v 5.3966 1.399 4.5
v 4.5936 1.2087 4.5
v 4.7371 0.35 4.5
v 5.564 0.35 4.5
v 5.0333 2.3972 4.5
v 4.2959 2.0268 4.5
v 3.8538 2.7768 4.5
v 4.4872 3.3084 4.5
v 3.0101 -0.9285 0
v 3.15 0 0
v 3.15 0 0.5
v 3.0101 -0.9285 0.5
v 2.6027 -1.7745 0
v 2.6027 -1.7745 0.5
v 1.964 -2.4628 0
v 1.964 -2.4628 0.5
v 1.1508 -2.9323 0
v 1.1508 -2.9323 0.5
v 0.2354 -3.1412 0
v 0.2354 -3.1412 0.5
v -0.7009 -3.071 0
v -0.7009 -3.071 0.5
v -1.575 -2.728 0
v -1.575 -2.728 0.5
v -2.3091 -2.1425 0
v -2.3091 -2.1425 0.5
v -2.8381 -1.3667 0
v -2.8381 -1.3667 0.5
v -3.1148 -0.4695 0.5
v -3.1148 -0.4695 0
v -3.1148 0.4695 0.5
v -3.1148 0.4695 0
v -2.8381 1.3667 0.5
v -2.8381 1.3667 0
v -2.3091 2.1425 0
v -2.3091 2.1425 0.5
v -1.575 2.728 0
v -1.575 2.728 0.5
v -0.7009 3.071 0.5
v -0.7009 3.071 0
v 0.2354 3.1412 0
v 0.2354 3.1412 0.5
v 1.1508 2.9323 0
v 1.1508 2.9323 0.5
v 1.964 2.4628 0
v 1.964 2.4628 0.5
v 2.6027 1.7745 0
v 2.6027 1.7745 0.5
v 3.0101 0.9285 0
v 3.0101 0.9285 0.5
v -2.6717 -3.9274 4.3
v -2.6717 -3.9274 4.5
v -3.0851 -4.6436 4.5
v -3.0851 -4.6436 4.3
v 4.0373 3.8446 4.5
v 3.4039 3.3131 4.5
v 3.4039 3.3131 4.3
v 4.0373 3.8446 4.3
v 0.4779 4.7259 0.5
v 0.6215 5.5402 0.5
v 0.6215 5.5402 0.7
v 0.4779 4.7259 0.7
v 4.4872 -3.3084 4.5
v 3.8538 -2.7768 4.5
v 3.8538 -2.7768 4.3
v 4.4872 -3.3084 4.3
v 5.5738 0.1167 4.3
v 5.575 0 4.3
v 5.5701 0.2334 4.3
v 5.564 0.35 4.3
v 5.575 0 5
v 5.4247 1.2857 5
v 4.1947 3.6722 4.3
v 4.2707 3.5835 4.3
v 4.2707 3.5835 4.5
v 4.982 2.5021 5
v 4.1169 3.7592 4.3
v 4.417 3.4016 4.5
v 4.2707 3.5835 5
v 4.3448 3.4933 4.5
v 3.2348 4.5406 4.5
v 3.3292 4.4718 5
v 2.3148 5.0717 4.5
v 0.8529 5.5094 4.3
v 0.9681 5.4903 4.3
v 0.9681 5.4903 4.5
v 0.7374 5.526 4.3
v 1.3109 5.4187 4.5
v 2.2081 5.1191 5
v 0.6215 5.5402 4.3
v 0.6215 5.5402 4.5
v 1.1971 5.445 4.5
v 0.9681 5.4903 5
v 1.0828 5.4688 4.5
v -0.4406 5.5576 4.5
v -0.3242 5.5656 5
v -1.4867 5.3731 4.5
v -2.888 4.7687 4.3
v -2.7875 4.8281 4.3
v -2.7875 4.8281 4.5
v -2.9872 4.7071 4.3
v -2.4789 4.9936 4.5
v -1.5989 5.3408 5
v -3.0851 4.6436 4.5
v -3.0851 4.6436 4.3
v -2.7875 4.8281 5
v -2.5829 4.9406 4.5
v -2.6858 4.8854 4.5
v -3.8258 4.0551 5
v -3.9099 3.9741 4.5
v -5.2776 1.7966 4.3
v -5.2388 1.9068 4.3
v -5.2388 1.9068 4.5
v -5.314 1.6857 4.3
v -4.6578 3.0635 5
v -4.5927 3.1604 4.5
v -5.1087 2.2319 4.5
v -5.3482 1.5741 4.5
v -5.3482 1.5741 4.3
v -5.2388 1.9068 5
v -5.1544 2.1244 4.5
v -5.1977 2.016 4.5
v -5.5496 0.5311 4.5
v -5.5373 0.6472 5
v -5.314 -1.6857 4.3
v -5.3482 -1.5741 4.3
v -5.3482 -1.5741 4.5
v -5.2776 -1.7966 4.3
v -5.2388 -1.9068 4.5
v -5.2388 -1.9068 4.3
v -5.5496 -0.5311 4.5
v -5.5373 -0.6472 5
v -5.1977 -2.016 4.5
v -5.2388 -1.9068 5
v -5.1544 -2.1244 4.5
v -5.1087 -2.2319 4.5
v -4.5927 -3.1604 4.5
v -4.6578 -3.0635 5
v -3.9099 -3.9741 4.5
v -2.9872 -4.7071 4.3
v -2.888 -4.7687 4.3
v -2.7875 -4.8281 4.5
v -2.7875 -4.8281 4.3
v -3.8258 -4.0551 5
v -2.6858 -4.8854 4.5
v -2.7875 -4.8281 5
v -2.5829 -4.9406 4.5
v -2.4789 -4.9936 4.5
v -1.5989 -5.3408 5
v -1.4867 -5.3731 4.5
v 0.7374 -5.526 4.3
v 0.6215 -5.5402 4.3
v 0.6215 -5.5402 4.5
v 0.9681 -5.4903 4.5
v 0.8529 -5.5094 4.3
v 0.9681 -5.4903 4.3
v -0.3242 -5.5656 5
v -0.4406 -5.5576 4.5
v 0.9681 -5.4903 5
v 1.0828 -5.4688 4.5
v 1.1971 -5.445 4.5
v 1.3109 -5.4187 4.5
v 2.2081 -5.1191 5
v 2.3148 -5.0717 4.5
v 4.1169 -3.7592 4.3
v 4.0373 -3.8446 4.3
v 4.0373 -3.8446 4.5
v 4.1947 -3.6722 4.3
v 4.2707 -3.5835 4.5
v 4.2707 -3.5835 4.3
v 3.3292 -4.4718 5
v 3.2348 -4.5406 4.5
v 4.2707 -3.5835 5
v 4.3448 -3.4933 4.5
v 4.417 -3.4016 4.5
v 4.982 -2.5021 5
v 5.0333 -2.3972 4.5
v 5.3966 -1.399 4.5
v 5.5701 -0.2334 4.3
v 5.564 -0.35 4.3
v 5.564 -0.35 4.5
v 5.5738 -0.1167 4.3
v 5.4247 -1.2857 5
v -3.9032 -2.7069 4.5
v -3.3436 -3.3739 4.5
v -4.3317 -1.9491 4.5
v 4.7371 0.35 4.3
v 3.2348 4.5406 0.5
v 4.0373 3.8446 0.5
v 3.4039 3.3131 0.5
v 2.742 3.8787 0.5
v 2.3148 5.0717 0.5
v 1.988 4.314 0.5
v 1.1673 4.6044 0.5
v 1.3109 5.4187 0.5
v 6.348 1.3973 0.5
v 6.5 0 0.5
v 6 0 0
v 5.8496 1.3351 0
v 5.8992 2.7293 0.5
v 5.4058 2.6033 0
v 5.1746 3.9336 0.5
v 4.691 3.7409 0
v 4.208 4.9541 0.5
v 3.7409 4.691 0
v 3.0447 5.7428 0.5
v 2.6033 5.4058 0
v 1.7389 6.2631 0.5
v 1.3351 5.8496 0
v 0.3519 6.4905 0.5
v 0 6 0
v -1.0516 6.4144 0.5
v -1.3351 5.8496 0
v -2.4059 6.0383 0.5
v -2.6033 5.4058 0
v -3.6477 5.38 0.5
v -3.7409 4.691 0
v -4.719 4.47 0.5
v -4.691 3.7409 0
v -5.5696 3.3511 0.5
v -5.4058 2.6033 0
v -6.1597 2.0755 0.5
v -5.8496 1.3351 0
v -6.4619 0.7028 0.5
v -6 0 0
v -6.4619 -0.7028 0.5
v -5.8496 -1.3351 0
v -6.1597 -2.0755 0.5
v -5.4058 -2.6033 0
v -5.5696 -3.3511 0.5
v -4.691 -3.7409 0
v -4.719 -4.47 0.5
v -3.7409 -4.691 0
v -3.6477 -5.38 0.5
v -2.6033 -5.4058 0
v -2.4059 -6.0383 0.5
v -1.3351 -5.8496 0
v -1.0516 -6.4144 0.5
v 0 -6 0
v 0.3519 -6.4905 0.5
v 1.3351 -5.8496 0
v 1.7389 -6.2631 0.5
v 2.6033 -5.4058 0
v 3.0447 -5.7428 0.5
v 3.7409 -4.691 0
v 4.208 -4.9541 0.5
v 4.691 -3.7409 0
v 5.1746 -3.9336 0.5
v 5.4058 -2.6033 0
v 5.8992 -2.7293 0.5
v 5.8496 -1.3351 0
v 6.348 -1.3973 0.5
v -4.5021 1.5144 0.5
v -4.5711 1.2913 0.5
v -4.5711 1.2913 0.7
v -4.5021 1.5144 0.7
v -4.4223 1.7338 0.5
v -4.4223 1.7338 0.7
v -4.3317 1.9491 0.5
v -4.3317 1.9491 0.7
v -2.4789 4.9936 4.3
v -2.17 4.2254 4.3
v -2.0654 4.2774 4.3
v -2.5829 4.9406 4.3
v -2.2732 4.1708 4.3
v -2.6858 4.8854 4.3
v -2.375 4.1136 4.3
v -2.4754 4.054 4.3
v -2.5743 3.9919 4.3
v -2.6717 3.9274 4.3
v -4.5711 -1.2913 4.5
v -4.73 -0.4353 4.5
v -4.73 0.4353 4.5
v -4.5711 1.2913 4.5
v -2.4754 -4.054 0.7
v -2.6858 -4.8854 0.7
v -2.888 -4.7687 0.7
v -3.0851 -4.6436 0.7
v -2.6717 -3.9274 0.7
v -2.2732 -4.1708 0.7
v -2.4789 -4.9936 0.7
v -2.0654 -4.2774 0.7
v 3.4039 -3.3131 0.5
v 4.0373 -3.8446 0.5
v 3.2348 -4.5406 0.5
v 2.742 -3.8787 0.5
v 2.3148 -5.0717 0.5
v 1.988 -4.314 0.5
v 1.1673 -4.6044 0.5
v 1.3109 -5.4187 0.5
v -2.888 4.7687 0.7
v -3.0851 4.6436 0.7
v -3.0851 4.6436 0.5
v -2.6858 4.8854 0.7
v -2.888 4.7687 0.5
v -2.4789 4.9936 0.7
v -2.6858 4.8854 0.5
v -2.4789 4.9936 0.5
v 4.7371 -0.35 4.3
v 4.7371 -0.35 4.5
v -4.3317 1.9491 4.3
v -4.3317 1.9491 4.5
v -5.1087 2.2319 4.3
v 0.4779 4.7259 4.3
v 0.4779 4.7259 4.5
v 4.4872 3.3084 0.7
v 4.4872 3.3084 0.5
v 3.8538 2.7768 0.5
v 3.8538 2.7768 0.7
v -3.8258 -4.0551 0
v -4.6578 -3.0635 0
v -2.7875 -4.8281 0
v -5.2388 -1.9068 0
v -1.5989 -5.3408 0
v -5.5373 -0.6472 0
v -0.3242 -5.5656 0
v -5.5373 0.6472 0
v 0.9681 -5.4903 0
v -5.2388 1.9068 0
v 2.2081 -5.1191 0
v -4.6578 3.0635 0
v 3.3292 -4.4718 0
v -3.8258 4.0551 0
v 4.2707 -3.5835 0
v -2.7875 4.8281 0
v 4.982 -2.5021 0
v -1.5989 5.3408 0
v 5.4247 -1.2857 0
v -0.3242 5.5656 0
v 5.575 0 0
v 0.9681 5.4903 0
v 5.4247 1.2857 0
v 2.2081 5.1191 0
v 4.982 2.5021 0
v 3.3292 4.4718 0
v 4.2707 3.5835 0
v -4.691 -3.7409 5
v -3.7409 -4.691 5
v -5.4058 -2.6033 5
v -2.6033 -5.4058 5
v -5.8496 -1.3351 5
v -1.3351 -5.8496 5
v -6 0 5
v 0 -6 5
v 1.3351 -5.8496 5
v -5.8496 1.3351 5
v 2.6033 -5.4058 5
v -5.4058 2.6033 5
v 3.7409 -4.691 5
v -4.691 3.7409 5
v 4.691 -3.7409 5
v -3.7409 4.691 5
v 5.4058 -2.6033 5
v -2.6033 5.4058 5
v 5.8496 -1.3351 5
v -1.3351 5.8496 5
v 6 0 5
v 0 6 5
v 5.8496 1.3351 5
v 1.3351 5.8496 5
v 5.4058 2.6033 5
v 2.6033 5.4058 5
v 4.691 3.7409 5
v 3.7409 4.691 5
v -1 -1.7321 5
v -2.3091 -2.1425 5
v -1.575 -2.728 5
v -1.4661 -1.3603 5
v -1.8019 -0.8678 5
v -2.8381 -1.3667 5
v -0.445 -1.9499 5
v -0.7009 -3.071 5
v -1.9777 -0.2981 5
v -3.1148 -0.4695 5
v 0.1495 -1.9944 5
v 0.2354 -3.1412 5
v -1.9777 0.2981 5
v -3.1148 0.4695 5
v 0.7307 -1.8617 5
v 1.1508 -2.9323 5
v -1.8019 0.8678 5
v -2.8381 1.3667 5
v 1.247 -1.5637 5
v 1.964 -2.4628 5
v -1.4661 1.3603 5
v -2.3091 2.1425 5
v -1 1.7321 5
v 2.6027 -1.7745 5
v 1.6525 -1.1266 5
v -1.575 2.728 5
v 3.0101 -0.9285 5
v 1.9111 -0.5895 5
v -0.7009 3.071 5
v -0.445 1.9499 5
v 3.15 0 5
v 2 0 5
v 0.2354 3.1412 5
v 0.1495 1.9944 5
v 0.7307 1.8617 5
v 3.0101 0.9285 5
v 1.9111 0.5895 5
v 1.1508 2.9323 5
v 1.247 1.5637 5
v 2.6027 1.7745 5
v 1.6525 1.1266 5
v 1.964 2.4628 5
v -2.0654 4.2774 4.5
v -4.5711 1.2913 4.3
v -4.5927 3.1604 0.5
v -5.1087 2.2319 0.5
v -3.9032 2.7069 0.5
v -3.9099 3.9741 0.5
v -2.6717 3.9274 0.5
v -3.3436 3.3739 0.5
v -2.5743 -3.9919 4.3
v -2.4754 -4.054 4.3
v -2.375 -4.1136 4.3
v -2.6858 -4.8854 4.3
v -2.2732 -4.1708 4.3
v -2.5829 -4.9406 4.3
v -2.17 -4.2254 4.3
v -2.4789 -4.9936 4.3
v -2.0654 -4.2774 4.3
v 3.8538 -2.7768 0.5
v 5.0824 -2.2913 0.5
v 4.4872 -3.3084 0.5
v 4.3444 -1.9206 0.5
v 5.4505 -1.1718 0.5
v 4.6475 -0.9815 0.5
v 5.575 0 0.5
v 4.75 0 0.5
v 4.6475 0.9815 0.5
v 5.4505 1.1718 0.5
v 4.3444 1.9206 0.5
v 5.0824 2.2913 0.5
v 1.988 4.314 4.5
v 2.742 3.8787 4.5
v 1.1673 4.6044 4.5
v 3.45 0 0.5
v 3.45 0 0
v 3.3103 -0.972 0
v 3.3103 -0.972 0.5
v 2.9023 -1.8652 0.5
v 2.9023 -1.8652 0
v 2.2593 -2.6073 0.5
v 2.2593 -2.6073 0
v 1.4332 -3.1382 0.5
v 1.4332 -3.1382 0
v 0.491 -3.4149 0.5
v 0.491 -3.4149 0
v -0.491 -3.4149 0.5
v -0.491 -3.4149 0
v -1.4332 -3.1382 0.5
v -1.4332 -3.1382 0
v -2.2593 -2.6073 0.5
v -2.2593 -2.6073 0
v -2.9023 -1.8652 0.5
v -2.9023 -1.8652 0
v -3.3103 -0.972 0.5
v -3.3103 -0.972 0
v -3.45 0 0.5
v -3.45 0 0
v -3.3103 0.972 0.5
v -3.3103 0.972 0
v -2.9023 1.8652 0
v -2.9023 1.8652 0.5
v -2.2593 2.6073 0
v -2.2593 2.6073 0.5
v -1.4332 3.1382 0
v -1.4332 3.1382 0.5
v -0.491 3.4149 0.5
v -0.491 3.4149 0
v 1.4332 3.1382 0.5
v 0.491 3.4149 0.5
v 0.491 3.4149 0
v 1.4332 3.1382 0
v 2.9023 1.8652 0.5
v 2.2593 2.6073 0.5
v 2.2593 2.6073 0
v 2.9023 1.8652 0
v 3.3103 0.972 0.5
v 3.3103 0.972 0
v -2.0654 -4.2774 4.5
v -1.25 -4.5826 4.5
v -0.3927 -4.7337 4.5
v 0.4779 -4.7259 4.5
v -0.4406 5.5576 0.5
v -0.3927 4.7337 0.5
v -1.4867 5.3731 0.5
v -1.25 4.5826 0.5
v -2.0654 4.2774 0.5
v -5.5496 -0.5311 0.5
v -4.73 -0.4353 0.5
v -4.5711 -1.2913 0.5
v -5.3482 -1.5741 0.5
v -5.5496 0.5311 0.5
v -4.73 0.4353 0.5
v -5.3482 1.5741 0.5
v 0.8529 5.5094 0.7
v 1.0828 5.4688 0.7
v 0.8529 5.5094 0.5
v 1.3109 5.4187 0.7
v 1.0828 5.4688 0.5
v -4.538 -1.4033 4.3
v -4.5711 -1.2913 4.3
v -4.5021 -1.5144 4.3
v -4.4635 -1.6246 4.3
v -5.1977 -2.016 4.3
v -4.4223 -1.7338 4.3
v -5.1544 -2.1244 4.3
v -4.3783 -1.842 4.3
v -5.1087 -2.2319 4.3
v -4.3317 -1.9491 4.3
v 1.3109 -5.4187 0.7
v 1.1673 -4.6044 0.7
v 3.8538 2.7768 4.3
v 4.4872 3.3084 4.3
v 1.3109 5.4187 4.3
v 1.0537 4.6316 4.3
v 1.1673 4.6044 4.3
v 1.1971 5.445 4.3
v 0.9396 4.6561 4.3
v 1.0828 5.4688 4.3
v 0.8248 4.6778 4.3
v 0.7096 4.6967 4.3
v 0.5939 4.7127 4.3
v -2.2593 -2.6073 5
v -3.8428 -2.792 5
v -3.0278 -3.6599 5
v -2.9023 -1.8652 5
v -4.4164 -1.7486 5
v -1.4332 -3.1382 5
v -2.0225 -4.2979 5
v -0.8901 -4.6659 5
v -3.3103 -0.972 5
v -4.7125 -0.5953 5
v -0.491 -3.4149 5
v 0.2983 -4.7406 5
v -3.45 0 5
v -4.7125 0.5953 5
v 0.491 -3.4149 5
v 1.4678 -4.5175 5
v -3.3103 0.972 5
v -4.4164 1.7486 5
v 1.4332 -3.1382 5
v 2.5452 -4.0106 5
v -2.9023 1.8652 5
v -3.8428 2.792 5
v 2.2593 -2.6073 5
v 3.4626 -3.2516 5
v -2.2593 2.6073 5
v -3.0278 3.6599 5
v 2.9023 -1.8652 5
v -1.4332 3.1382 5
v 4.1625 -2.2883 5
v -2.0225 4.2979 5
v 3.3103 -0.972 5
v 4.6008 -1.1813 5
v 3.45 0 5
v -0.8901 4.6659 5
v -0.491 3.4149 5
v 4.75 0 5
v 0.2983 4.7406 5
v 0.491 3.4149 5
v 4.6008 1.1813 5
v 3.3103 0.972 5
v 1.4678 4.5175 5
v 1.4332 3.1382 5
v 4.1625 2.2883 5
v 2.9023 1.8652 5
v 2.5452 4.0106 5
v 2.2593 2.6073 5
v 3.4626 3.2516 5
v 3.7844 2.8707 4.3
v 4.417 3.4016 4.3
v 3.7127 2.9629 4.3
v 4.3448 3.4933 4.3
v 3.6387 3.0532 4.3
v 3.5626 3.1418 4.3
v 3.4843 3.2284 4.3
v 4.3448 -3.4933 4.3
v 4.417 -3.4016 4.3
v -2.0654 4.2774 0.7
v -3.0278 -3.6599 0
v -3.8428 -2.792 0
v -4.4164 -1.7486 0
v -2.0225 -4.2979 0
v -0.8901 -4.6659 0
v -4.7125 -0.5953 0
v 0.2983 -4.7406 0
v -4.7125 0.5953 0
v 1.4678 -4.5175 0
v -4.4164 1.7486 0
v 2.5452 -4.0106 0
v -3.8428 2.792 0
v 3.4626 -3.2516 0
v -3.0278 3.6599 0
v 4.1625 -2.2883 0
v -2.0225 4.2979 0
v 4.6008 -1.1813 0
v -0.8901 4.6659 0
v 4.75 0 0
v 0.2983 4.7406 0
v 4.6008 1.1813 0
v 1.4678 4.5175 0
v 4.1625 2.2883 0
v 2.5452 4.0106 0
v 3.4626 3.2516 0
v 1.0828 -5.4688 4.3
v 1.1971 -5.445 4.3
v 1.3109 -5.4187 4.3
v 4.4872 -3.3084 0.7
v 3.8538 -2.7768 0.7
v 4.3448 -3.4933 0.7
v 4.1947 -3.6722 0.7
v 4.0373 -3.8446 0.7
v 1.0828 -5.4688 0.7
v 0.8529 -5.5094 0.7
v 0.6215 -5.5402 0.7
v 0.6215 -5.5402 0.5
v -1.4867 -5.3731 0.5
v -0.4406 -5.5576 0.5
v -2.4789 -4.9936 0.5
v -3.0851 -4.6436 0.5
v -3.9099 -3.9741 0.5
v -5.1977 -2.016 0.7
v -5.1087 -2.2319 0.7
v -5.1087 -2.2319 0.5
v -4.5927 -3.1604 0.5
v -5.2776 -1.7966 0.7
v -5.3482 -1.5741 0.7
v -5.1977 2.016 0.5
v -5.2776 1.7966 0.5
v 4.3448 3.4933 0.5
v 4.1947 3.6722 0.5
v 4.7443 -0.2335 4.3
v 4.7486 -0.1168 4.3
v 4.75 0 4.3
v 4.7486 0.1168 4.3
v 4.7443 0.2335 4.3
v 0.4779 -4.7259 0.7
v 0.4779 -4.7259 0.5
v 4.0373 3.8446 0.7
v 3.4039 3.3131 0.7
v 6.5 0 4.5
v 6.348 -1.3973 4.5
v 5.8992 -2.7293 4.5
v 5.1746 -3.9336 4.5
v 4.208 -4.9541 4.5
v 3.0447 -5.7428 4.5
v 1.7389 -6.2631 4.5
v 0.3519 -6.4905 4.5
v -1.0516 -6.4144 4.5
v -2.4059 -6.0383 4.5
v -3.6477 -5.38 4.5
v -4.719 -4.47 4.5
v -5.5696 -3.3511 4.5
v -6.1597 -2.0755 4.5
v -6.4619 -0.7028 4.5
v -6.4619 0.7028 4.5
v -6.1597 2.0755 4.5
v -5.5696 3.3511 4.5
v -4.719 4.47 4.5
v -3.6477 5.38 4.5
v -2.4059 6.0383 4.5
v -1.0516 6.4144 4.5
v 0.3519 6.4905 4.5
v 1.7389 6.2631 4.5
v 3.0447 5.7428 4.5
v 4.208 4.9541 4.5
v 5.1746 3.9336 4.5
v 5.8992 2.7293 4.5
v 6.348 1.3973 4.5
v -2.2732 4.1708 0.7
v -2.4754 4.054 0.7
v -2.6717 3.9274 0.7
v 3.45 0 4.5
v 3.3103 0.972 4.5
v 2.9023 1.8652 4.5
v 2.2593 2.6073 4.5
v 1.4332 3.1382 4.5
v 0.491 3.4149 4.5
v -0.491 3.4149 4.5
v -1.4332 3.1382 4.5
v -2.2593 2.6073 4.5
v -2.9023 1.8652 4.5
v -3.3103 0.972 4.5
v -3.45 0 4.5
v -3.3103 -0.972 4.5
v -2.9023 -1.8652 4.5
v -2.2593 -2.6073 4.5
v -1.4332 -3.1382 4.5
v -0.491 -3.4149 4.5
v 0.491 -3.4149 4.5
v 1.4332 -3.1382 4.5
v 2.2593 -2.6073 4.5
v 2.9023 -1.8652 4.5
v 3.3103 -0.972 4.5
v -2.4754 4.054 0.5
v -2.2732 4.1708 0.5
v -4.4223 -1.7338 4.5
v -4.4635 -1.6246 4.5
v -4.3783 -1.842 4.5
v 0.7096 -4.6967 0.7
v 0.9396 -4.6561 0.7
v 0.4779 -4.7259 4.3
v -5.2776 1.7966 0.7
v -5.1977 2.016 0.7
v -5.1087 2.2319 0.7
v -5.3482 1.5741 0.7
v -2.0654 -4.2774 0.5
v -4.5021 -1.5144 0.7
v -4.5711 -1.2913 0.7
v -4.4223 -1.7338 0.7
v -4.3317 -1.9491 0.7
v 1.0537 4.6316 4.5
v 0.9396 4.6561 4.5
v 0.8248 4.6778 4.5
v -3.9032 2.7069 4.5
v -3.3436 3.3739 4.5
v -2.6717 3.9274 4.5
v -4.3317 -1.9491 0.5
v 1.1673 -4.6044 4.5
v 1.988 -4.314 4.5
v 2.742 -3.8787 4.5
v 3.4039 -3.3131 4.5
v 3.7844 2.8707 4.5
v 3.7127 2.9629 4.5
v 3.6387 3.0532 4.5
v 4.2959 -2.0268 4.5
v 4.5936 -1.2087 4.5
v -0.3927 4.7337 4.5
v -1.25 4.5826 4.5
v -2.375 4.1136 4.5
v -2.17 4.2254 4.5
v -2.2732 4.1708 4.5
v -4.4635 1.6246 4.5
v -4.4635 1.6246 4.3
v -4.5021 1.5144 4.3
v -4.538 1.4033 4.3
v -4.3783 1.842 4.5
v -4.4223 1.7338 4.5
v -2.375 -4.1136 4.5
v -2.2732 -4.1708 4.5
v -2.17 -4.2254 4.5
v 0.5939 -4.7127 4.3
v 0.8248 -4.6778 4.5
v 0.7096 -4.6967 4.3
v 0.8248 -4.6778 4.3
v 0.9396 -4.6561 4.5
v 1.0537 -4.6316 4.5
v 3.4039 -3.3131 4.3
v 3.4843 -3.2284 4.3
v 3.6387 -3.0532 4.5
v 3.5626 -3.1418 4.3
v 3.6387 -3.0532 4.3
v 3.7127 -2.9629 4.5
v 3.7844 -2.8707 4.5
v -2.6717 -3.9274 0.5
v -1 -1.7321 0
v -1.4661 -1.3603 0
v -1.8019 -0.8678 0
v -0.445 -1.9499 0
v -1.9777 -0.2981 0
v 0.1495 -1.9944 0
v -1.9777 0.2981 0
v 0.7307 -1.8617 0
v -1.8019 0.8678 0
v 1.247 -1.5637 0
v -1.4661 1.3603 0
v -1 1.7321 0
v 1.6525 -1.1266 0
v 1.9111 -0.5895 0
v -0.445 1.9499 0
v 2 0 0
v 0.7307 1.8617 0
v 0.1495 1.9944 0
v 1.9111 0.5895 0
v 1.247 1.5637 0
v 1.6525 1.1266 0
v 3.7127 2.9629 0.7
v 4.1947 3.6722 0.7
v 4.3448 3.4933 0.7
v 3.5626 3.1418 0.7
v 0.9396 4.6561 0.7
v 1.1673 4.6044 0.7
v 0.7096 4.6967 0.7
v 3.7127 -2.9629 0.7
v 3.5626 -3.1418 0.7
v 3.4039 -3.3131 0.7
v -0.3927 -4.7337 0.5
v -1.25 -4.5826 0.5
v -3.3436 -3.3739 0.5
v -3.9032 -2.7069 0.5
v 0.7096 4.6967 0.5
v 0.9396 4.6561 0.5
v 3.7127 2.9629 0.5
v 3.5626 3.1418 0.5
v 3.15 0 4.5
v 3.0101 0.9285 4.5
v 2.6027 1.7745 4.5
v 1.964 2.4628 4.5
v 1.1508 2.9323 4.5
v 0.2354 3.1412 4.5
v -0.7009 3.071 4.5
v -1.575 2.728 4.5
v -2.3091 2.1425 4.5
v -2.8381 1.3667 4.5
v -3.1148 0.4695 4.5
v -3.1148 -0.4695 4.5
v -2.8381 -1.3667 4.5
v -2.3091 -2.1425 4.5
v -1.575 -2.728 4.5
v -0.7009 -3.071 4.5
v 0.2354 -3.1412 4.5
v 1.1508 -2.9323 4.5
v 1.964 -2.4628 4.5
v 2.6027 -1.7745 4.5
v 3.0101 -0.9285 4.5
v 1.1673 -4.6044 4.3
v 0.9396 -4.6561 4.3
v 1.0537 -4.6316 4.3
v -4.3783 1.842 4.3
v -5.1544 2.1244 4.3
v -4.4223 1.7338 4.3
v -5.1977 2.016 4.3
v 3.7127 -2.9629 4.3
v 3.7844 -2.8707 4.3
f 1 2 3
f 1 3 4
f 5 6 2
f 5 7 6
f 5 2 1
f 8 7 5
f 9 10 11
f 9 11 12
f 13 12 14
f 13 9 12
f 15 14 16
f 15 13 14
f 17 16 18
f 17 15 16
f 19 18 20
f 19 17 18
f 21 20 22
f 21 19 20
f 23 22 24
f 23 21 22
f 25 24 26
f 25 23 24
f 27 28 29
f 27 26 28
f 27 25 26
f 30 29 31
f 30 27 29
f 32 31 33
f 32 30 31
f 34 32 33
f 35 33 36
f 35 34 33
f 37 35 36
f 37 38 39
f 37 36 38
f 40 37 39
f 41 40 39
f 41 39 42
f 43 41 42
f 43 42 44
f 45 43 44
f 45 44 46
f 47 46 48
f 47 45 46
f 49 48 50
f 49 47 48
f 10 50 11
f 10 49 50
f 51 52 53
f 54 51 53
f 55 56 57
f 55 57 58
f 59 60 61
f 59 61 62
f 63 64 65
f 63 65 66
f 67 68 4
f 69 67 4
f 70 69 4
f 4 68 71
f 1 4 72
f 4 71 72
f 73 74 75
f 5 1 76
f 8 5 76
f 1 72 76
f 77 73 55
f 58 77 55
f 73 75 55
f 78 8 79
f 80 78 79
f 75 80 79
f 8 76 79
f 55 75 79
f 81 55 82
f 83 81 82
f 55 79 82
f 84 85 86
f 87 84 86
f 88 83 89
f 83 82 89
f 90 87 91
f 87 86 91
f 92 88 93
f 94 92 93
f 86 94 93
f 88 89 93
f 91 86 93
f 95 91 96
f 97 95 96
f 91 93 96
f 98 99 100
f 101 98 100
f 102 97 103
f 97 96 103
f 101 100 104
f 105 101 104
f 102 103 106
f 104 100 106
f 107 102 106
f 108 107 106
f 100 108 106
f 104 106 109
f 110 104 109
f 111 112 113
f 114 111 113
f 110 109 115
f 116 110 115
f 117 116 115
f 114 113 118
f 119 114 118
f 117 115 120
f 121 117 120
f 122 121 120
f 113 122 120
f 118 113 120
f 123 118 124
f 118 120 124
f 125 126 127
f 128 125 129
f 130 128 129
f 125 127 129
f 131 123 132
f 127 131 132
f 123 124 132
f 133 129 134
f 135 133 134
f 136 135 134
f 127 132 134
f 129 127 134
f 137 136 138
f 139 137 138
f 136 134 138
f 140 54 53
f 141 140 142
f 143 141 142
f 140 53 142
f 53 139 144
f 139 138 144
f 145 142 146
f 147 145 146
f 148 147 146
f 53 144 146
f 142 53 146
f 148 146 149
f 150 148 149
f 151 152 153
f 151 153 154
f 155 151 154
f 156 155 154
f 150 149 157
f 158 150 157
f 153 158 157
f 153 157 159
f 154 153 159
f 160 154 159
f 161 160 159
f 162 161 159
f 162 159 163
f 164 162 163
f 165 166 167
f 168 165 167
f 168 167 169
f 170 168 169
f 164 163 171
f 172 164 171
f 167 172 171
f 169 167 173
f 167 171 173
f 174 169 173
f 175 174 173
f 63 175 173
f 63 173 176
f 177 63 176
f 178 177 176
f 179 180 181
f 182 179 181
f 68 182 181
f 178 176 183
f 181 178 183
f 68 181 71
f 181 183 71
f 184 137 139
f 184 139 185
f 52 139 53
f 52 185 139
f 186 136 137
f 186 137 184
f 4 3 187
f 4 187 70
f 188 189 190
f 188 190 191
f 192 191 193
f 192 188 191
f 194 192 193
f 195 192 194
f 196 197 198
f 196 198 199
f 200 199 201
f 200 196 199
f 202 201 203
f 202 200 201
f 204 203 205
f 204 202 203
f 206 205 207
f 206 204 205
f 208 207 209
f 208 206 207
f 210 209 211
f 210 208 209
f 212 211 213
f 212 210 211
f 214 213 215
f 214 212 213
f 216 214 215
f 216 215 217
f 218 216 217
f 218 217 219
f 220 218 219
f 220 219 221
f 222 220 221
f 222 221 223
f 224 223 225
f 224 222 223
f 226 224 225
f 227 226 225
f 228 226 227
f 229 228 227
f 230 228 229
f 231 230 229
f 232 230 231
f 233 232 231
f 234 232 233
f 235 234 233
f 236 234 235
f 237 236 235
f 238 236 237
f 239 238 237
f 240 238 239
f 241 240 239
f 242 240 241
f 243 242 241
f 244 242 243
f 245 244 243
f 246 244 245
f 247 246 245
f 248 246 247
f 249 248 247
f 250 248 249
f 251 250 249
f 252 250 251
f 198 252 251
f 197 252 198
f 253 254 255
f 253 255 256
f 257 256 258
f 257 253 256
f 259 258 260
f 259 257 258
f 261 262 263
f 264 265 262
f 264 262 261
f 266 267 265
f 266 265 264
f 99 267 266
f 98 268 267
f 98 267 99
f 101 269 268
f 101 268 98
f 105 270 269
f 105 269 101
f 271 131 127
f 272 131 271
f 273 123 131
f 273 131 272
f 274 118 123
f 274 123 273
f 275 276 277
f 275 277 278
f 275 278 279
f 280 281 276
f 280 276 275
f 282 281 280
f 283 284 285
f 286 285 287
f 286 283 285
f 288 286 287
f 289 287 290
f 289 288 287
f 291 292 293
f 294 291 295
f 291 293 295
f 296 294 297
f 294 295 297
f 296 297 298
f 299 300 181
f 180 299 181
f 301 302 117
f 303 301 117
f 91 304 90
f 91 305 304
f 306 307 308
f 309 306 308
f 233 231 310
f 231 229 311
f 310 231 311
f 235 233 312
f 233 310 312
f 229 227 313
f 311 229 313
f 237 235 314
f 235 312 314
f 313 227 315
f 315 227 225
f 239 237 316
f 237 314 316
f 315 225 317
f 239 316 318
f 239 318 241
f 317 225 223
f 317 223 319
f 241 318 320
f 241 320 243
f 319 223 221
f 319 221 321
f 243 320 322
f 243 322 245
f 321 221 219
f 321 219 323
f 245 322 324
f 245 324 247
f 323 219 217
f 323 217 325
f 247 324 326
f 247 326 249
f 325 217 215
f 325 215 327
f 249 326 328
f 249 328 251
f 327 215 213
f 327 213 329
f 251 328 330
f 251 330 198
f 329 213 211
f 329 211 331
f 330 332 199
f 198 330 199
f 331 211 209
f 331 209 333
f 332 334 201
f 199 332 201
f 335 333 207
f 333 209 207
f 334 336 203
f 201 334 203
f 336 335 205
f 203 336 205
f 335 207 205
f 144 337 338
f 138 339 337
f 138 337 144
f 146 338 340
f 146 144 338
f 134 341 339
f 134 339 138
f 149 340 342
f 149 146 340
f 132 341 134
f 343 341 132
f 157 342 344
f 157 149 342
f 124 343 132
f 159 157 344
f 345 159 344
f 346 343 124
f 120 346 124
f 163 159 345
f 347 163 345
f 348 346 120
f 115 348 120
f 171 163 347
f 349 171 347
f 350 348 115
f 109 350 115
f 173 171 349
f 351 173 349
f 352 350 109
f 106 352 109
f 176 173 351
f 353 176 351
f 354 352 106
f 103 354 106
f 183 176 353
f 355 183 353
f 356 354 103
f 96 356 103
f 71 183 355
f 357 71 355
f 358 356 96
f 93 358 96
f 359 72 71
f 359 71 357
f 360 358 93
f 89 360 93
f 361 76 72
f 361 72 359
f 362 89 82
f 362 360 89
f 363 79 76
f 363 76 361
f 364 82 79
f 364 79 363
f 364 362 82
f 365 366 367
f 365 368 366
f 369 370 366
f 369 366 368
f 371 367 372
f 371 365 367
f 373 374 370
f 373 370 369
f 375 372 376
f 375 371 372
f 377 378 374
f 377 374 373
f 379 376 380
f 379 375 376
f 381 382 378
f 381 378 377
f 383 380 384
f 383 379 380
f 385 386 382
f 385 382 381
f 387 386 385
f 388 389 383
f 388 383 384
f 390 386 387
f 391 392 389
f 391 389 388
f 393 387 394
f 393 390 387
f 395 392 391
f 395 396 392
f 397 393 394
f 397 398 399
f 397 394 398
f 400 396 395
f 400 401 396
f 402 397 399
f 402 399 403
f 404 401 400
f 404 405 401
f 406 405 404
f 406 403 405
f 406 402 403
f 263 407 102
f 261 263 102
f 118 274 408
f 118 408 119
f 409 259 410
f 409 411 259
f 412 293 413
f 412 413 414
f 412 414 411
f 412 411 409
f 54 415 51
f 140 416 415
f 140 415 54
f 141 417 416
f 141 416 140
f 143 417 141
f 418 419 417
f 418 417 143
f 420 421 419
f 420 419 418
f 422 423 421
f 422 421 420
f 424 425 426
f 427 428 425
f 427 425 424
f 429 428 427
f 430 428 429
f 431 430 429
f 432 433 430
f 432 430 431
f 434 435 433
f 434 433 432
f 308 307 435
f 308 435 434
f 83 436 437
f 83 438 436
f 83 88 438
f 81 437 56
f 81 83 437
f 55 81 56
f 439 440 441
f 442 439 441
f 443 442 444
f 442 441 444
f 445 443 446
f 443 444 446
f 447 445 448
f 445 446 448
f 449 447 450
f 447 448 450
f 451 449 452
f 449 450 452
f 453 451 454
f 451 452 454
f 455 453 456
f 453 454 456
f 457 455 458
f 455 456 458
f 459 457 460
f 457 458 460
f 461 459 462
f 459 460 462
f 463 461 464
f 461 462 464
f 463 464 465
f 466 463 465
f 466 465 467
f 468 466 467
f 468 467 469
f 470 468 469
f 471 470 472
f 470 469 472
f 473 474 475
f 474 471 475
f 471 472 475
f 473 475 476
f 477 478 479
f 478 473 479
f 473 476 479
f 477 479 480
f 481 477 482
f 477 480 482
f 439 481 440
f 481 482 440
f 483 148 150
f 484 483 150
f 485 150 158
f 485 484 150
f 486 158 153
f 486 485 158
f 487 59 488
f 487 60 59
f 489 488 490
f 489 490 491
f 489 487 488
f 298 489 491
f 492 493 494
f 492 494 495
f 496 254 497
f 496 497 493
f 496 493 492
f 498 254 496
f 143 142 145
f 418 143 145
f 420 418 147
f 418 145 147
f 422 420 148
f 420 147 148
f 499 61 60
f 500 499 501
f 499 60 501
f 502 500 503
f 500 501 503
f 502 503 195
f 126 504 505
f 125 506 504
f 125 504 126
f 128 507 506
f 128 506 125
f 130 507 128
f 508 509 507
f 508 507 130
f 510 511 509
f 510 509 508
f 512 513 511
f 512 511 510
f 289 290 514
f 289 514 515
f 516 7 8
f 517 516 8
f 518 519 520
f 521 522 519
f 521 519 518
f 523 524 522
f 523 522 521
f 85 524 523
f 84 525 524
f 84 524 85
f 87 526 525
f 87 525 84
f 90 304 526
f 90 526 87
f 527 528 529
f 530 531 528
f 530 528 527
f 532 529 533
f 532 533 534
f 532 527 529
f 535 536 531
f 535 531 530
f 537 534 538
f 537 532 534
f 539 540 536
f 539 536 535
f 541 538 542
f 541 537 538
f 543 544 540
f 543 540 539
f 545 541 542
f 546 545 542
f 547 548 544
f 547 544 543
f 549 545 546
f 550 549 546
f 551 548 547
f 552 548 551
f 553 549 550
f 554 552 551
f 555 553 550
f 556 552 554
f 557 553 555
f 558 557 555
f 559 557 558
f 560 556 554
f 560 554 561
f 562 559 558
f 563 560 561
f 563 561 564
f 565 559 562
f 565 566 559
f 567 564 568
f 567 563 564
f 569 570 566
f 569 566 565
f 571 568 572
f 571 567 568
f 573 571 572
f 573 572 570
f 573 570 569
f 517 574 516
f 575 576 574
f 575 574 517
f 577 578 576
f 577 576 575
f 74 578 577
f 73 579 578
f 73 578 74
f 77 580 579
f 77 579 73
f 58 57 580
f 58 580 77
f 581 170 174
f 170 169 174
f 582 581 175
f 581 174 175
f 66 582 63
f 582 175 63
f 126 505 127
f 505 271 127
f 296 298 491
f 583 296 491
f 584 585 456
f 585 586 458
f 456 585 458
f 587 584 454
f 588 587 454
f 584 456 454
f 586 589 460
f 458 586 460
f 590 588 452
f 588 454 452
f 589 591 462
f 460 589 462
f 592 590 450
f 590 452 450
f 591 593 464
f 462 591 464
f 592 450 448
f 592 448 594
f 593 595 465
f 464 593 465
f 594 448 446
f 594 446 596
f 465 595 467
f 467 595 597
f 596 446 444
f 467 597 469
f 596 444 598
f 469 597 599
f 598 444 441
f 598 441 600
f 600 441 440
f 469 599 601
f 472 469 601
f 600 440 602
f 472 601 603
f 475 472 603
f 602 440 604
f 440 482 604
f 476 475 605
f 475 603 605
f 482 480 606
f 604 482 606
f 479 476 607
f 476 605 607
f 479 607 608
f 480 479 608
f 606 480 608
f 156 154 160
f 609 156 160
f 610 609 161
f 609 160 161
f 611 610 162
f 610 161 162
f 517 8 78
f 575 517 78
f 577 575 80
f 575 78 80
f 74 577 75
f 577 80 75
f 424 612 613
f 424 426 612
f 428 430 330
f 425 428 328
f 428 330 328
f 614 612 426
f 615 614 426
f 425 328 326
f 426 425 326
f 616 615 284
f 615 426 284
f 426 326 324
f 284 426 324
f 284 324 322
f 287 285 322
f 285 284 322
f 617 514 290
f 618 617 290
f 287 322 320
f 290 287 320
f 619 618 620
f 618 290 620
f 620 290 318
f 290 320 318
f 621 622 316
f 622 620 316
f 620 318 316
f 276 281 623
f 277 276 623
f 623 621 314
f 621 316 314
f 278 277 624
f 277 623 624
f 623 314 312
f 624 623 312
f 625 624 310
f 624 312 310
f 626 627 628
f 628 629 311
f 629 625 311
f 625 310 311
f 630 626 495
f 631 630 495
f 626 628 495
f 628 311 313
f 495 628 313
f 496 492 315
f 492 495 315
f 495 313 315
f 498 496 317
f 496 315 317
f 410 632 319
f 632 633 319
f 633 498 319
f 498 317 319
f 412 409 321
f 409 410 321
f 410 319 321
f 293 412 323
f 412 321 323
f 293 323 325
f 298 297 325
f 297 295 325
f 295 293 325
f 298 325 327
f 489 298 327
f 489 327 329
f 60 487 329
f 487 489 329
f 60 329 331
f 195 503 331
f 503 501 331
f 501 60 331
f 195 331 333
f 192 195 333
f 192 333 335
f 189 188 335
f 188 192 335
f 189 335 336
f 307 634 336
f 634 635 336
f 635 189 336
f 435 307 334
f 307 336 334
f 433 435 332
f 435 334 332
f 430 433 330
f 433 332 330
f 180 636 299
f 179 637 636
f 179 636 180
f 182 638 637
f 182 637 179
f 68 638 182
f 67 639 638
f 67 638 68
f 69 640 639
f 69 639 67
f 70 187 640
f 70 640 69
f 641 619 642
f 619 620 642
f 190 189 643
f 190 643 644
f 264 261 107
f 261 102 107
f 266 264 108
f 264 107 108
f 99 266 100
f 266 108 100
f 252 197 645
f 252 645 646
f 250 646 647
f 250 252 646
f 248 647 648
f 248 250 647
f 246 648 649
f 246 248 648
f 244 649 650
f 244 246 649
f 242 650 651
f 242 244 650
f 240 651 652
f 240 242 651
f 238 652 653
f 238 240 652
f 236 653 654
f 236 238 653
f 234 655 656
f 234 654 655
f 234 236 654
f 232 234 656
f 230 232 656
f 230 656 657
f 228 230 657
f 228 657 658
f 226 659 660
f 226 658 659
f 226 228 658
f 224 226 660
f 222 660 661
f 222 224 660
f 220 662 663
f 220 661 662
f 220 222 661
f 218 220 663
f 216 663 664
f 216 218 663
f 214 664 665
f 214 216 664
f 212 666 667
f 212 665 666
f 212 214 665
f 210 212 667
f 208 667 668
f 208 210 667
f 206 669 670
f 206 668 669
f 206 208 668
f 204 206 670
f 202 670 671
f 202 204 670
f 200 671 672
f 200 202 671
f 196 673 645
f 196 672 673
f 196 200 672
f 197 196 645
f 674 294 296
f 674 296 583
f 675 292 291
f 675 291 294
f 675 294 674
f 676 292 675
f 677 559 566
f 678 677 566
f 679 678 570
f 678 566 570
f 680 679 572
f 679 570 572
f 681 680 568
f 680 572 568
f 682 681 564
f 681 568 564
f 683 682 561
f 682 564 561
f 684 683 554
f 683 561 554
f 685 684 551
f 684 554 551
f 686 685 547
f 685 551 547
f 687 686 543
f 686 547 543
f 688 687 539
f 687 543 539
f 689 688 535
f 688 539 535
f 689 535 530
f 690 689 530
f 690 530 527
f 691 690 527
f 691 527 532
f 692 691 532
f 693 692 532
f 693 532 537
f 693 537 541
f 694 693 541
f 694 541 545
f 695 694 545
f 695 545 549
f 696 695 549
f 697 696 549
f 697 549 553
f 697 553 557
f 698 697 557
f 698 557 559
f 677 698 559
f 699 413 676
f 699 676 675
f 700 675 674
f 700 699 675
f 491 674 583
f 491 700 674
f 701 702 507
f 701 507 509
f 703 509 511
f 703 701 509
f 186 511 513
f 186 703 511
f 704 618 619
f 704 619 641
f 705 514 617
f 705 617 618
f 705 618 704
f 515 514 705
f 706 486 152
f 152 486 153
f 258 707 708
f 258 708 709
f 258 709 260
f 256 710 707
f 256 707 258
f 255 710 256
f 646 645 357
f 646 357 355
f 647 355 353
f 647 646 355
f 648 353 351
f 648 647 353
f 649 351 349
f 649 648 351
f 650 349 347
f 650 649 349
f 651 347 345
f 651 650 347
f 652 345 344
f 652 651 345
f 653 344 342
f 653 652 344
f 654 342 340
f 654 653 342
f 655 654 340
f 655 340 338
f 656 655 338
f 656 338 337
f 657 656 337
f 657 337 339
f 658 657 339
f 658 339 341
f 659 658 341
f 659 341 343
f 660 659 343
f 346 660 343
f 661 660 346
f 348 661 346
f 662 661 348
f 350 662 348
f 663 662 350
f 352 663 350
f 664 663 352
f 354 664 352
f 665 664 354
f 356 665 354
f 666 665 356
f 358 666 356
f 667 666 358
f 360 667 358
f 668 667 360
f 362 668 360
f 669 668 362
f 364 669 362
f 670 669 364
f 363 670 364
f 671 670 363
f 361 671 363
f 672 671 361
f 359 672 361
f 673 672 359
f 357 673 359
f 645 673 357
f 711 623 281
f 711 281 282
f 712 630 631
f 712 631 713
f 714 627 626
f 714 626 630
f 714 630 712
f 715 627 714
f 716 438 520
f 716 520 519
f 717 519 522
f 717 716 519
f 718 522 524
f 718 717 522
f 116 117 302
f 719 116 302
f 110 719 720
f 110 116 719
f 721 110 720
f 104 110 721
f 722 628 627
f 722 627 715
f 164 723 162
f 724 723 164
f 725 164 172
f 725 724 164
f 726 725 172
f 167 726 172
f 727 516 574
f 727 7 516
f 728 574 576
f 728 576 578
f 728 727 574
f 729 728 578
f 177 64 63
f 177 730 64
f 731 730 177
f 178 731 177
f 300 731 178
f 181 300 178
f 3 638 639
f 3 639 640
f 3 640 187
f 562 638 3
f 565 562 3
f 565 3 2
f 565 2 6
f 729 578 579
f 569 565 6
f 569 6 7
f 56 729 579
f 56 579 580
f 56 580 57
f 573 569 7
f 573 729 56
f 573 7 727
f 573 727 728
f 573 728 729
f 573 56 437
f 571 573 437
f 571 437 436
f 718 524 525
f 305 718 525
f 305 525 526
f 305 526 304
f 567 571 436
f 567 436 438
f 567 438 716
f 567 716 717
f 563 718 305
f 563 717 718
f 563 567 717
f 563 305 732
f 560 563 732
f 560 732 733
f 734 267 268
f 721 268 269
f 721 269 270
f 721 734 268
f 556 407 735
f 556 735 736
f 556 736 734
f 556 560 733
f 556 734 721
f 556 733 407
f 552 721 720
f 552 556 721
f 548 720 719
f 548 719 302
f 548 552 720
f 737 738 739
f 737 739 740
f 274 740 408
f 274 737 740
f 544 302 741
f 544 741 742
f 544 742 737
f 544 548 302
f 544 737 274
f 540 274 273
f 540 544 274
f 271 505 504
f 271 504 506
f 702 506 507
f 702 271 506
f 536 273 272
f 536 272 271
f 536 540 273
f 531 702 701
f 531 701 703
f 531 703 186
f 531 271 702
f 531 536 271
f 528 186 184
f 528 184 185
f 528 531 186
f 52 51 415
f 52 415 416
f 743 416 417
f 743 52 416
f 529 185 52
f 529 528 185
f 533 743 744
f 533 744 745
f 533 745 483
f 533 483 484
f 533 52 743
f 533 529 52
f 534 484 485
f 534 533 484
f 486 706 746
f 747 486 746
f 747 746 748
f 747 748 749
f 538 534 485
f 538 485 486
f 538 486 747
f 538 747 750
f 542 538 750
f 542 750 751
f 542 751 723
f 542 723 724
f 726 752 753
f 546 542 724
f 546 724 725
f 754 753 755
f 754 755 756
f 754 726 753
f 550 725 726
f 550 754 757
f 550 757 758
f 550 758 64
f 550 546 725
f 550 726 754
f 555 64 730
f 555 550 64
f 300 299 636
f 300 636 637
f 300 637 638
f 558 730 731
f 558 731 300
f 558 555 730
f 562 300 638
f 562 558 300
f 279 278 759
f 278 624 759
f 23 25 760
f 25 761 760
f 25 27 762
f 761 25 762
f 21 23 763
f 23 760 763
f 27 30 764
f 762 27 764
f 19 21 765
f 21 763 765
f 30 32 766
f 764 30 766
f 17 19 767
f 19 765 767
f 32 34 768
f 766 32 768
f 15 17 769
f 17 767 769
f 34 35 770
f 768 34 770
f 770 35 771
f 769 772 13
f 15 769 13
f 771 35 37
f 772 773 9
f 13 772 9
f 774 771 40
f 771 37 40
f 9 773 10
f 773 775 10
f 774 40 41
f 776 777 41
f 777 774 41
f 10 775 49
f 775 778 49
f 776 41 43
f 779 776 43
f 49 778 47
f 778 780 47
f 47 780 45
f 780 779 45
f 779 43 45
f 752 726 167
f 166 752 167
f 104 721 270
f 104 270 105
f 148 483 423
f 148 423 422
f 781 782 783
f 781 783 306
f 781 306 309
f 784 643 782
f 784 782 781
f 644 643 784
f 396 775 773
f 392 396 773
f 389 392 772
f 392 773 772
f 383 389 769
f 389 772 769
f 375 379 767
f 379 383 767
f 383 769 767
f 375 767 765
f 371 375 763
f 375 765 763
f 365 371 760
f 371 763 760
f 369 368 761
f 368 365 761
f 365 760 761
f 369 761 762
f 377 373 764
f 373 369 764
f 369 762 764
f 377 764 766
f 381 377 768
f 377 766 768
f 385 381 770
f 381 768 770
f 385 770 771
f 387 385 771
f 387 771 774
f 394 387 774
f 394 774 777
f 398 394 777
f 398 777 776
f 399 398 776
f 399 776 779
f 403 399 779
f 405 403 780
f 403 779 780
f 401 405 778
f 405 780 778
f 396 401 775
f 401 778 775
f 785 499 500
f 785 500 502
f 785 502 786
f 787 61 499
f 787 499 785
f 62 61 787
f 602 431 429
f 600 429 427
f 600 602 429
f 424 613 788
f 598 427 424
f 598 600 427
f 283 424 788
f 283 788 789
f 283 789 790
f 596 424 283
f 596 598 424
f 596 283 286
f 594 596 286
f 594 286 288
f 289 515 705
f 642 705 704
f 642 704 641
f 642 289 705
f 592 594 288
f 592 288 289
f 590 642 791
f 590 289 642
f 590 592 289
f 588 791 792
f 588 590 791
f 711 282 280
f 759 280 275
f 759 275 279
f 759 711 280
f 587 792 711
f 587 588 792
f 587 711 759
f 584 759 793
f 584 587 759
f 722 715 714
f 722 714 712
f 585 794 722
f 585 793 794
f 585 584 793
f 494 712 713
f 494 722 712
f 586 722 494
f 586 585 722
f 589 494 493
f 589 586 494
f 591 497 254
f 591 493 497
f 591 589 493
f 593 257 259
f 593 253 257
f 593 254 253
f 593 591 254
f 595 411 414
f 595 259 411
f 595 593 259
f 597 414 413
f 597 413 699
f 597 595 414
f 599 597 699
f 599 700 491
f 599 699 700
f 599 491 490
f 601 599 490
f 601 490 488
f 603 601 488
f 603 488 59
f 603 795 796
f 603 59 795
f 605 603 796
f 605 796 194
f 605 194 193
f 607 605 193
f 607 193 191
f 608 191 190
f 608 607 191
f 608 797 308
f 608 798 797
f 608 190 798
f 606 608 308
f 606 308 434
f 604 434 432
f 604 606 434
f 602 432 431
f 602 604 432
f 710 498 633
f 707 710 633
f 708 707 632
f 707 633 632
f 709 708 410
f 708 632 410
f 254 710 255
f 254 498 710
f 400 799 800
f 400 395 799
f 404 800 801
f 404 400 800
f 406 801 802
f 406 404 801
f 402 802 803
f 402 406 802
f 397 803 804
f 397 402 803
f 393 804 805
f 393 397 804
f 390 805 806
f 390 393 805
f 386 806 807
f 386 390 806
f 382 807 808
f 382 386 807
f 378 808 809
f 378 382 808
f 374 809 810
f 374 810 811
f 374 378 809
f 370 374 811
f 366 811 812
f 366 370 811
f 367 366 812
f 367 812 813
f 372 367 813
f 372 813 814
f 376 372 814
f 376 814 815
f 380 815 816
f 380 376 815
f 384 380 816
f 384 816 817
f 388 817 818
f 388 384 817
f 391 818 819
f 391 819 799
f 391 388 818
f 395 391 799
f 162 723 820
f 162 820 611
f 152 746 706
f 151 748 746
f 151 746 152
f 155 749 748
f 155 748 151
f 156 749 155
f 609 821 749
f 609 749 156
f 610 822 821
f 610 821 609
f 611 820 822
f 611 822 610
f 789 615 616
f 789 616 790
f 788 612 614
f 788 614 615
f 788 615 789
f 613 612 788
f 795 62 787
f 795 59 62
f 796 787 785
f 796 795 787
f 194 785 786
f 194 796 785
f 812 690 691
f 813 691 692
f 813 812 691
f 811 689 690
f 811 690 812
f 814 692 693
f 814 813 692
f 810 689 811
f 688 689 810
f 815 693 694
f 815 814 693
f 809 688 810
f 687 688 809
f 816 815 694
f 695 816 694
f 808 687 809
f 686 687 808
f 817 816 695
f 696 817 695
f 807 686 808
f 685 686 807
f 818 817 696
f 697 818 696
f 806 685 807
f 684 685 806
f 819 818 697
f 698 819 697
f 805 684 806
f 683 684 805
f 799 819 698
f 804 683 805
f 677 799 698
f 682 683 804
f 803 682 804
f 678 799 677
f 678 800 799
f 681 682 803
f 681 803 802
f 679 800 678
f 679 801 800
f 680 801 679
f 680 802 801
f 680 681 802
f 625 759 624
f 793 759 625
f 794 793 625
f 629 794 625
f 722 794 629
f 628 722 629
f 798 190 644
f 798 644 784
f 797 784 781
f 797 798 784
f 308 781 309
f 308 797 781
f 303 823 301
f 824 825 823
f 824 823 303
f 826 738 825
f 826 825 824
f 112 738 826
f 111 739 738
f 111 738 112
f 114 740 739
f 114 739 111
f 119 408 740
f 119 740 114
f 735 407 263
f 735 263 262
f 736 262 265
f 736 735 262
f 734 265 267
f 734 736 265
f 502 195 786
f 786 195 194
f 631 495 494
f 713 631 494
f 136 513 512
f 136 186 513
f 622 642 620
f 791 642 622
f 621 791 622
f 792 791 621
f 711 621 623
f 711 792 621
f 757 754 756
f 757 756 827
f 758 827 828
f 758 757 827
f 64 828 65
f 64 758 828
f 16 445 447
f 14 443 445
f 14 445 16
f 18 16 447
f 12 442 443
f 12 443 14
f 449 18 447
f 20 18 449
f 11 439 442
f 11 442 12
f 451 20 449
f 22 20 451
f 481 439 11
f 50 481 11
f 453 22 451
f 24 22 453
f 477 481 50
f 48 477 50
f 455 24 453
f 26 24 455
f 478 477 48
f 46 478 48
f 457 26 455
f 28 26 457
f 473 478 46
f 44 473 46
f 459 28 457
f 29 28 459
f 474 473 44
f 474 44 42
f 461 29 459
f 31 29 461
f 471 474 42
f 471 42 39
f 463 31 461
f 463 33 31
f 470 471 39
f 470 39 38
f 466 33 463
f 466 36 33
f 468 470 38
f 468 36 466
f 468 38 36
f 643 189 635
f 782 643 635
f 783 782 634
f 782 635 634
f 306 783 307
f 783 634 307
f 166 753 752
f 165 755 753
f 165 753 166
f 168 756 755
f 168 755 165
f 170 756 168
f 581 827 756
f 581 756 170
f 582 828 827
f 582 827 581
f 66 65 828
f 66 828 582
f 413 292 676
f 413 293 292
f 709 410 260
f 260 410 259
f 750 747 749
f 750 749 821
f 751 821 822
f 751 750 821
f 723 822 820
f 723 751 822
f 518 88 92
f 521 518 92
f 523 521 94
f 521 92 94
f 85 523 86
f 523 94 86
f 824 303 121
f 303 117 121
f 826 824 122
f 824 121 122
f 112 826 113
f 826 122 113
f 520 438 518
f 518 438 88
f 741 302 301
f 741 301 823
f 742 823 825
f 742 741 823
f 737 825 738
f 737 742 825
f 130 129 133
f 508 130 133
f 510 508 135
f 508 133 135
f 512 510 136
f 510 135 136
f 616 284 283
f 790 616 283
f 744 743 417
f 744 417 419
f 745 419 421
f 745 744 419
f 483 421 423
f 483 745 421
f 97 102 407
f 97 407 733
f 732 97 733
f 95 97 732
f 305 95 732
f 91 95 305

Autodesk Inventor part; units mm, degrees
ref_plane "YZ Plane" through (0, 0, 0) normal (1, 0, 0) x (0, 1, 0)
ref_plane "XZ Plane" through (0, 0, 0) normal (0, 1, 0) x (-1, 0, 0)
sketch "Sketch1" plane through (0, 0, 0) normal (0, 0, 1) x (1, 0, 0)
  circle A0 centre (0, 0) radius 6.5
  circle A1 centre (0, 0) radius 2
  dimension "d0" = 13
  dimension "d1" = 4
extrude "Extrusion1" add sketch "Sketch1" along normal blind 5
chamfer "Chamfer1" distance 0.5 angle 45 2 edges at (-6.5, 0, 5) (-6.5, 0, 0)
sketch "Sketch2" plane through (0, 0, 5) normal (0, 0, 1) x (1, 0, 0)
  circle A0 centre (0, 0) radius 6 projected
  circle A1 centre (0, 0) radius 3.15
  circle A2 centre (0, 0) radius 3.45
  circle A3 centre (0, 0) radius 4.75
  circle A4 centre (0, 0) radius 5.575
  dimension "d7" = 6.3
  dimension "d8" = 6.9
  dimension "d9" = 9.5
  dimension "d10" = 11.15
extrude "Extrusion2" cut sketch "Sketch2" against normal blind 0.5 contours A2 | A4
ref_plane "Work Plane1" through (0, 0, 2.5) normal (0, 0, -1) x (-1, 0, 0)
sketch "Sketch3" plane through (0, 0, 4.5) normal (0, 0, 1) x (1, 0, 0)
  circle A0 centre (0, 0) radius 4.75 projected
  circle A1 centre (0, 0) radius 5.575 projected
  circle A2 centre (0, 0) radius 4.75 construction
  circle A3 centre (0, 0) radius 5.575 construction
  line L0 (-9.1, 0) -> (9.1, 0) construction
  line L1 (4.6568, 0.35) -> (5.7132, 0.35)
  line L2 (4.5944, -0.35) -> (5.8021, -0.35)
  line L3 (5.349, 0.35) -> (5.7285, 0.35)
  arc A4 (4.7371, -0.35) -> (4.7371, 0.35) centre (0, 0) ccw
  arc A5 (5.564, -0.35) -> (5.564, 0.35) centre (0, 0) ccw
  dimension "d14" = 0.35
  dimension "d15" = 0.35
extrude "Extrusion3" cut sketch "Sketch3" against normal blind 0.2 contours A0 L1 A1 L2 picked at (5.2247, 0.1167)
pattern_circular "Circular Pattern1" count 9 over 360 about axis through (0, 0, -10) along (0, 0, 1) of "Extrusion3"
mirror "Mirror1" about plane through (0, 0, 2.5) normal (0, 0, -1) of "Circular Pattern1", "Extrusion2"
properties part number "Bearing-605zz" material "Stainless Steel"
